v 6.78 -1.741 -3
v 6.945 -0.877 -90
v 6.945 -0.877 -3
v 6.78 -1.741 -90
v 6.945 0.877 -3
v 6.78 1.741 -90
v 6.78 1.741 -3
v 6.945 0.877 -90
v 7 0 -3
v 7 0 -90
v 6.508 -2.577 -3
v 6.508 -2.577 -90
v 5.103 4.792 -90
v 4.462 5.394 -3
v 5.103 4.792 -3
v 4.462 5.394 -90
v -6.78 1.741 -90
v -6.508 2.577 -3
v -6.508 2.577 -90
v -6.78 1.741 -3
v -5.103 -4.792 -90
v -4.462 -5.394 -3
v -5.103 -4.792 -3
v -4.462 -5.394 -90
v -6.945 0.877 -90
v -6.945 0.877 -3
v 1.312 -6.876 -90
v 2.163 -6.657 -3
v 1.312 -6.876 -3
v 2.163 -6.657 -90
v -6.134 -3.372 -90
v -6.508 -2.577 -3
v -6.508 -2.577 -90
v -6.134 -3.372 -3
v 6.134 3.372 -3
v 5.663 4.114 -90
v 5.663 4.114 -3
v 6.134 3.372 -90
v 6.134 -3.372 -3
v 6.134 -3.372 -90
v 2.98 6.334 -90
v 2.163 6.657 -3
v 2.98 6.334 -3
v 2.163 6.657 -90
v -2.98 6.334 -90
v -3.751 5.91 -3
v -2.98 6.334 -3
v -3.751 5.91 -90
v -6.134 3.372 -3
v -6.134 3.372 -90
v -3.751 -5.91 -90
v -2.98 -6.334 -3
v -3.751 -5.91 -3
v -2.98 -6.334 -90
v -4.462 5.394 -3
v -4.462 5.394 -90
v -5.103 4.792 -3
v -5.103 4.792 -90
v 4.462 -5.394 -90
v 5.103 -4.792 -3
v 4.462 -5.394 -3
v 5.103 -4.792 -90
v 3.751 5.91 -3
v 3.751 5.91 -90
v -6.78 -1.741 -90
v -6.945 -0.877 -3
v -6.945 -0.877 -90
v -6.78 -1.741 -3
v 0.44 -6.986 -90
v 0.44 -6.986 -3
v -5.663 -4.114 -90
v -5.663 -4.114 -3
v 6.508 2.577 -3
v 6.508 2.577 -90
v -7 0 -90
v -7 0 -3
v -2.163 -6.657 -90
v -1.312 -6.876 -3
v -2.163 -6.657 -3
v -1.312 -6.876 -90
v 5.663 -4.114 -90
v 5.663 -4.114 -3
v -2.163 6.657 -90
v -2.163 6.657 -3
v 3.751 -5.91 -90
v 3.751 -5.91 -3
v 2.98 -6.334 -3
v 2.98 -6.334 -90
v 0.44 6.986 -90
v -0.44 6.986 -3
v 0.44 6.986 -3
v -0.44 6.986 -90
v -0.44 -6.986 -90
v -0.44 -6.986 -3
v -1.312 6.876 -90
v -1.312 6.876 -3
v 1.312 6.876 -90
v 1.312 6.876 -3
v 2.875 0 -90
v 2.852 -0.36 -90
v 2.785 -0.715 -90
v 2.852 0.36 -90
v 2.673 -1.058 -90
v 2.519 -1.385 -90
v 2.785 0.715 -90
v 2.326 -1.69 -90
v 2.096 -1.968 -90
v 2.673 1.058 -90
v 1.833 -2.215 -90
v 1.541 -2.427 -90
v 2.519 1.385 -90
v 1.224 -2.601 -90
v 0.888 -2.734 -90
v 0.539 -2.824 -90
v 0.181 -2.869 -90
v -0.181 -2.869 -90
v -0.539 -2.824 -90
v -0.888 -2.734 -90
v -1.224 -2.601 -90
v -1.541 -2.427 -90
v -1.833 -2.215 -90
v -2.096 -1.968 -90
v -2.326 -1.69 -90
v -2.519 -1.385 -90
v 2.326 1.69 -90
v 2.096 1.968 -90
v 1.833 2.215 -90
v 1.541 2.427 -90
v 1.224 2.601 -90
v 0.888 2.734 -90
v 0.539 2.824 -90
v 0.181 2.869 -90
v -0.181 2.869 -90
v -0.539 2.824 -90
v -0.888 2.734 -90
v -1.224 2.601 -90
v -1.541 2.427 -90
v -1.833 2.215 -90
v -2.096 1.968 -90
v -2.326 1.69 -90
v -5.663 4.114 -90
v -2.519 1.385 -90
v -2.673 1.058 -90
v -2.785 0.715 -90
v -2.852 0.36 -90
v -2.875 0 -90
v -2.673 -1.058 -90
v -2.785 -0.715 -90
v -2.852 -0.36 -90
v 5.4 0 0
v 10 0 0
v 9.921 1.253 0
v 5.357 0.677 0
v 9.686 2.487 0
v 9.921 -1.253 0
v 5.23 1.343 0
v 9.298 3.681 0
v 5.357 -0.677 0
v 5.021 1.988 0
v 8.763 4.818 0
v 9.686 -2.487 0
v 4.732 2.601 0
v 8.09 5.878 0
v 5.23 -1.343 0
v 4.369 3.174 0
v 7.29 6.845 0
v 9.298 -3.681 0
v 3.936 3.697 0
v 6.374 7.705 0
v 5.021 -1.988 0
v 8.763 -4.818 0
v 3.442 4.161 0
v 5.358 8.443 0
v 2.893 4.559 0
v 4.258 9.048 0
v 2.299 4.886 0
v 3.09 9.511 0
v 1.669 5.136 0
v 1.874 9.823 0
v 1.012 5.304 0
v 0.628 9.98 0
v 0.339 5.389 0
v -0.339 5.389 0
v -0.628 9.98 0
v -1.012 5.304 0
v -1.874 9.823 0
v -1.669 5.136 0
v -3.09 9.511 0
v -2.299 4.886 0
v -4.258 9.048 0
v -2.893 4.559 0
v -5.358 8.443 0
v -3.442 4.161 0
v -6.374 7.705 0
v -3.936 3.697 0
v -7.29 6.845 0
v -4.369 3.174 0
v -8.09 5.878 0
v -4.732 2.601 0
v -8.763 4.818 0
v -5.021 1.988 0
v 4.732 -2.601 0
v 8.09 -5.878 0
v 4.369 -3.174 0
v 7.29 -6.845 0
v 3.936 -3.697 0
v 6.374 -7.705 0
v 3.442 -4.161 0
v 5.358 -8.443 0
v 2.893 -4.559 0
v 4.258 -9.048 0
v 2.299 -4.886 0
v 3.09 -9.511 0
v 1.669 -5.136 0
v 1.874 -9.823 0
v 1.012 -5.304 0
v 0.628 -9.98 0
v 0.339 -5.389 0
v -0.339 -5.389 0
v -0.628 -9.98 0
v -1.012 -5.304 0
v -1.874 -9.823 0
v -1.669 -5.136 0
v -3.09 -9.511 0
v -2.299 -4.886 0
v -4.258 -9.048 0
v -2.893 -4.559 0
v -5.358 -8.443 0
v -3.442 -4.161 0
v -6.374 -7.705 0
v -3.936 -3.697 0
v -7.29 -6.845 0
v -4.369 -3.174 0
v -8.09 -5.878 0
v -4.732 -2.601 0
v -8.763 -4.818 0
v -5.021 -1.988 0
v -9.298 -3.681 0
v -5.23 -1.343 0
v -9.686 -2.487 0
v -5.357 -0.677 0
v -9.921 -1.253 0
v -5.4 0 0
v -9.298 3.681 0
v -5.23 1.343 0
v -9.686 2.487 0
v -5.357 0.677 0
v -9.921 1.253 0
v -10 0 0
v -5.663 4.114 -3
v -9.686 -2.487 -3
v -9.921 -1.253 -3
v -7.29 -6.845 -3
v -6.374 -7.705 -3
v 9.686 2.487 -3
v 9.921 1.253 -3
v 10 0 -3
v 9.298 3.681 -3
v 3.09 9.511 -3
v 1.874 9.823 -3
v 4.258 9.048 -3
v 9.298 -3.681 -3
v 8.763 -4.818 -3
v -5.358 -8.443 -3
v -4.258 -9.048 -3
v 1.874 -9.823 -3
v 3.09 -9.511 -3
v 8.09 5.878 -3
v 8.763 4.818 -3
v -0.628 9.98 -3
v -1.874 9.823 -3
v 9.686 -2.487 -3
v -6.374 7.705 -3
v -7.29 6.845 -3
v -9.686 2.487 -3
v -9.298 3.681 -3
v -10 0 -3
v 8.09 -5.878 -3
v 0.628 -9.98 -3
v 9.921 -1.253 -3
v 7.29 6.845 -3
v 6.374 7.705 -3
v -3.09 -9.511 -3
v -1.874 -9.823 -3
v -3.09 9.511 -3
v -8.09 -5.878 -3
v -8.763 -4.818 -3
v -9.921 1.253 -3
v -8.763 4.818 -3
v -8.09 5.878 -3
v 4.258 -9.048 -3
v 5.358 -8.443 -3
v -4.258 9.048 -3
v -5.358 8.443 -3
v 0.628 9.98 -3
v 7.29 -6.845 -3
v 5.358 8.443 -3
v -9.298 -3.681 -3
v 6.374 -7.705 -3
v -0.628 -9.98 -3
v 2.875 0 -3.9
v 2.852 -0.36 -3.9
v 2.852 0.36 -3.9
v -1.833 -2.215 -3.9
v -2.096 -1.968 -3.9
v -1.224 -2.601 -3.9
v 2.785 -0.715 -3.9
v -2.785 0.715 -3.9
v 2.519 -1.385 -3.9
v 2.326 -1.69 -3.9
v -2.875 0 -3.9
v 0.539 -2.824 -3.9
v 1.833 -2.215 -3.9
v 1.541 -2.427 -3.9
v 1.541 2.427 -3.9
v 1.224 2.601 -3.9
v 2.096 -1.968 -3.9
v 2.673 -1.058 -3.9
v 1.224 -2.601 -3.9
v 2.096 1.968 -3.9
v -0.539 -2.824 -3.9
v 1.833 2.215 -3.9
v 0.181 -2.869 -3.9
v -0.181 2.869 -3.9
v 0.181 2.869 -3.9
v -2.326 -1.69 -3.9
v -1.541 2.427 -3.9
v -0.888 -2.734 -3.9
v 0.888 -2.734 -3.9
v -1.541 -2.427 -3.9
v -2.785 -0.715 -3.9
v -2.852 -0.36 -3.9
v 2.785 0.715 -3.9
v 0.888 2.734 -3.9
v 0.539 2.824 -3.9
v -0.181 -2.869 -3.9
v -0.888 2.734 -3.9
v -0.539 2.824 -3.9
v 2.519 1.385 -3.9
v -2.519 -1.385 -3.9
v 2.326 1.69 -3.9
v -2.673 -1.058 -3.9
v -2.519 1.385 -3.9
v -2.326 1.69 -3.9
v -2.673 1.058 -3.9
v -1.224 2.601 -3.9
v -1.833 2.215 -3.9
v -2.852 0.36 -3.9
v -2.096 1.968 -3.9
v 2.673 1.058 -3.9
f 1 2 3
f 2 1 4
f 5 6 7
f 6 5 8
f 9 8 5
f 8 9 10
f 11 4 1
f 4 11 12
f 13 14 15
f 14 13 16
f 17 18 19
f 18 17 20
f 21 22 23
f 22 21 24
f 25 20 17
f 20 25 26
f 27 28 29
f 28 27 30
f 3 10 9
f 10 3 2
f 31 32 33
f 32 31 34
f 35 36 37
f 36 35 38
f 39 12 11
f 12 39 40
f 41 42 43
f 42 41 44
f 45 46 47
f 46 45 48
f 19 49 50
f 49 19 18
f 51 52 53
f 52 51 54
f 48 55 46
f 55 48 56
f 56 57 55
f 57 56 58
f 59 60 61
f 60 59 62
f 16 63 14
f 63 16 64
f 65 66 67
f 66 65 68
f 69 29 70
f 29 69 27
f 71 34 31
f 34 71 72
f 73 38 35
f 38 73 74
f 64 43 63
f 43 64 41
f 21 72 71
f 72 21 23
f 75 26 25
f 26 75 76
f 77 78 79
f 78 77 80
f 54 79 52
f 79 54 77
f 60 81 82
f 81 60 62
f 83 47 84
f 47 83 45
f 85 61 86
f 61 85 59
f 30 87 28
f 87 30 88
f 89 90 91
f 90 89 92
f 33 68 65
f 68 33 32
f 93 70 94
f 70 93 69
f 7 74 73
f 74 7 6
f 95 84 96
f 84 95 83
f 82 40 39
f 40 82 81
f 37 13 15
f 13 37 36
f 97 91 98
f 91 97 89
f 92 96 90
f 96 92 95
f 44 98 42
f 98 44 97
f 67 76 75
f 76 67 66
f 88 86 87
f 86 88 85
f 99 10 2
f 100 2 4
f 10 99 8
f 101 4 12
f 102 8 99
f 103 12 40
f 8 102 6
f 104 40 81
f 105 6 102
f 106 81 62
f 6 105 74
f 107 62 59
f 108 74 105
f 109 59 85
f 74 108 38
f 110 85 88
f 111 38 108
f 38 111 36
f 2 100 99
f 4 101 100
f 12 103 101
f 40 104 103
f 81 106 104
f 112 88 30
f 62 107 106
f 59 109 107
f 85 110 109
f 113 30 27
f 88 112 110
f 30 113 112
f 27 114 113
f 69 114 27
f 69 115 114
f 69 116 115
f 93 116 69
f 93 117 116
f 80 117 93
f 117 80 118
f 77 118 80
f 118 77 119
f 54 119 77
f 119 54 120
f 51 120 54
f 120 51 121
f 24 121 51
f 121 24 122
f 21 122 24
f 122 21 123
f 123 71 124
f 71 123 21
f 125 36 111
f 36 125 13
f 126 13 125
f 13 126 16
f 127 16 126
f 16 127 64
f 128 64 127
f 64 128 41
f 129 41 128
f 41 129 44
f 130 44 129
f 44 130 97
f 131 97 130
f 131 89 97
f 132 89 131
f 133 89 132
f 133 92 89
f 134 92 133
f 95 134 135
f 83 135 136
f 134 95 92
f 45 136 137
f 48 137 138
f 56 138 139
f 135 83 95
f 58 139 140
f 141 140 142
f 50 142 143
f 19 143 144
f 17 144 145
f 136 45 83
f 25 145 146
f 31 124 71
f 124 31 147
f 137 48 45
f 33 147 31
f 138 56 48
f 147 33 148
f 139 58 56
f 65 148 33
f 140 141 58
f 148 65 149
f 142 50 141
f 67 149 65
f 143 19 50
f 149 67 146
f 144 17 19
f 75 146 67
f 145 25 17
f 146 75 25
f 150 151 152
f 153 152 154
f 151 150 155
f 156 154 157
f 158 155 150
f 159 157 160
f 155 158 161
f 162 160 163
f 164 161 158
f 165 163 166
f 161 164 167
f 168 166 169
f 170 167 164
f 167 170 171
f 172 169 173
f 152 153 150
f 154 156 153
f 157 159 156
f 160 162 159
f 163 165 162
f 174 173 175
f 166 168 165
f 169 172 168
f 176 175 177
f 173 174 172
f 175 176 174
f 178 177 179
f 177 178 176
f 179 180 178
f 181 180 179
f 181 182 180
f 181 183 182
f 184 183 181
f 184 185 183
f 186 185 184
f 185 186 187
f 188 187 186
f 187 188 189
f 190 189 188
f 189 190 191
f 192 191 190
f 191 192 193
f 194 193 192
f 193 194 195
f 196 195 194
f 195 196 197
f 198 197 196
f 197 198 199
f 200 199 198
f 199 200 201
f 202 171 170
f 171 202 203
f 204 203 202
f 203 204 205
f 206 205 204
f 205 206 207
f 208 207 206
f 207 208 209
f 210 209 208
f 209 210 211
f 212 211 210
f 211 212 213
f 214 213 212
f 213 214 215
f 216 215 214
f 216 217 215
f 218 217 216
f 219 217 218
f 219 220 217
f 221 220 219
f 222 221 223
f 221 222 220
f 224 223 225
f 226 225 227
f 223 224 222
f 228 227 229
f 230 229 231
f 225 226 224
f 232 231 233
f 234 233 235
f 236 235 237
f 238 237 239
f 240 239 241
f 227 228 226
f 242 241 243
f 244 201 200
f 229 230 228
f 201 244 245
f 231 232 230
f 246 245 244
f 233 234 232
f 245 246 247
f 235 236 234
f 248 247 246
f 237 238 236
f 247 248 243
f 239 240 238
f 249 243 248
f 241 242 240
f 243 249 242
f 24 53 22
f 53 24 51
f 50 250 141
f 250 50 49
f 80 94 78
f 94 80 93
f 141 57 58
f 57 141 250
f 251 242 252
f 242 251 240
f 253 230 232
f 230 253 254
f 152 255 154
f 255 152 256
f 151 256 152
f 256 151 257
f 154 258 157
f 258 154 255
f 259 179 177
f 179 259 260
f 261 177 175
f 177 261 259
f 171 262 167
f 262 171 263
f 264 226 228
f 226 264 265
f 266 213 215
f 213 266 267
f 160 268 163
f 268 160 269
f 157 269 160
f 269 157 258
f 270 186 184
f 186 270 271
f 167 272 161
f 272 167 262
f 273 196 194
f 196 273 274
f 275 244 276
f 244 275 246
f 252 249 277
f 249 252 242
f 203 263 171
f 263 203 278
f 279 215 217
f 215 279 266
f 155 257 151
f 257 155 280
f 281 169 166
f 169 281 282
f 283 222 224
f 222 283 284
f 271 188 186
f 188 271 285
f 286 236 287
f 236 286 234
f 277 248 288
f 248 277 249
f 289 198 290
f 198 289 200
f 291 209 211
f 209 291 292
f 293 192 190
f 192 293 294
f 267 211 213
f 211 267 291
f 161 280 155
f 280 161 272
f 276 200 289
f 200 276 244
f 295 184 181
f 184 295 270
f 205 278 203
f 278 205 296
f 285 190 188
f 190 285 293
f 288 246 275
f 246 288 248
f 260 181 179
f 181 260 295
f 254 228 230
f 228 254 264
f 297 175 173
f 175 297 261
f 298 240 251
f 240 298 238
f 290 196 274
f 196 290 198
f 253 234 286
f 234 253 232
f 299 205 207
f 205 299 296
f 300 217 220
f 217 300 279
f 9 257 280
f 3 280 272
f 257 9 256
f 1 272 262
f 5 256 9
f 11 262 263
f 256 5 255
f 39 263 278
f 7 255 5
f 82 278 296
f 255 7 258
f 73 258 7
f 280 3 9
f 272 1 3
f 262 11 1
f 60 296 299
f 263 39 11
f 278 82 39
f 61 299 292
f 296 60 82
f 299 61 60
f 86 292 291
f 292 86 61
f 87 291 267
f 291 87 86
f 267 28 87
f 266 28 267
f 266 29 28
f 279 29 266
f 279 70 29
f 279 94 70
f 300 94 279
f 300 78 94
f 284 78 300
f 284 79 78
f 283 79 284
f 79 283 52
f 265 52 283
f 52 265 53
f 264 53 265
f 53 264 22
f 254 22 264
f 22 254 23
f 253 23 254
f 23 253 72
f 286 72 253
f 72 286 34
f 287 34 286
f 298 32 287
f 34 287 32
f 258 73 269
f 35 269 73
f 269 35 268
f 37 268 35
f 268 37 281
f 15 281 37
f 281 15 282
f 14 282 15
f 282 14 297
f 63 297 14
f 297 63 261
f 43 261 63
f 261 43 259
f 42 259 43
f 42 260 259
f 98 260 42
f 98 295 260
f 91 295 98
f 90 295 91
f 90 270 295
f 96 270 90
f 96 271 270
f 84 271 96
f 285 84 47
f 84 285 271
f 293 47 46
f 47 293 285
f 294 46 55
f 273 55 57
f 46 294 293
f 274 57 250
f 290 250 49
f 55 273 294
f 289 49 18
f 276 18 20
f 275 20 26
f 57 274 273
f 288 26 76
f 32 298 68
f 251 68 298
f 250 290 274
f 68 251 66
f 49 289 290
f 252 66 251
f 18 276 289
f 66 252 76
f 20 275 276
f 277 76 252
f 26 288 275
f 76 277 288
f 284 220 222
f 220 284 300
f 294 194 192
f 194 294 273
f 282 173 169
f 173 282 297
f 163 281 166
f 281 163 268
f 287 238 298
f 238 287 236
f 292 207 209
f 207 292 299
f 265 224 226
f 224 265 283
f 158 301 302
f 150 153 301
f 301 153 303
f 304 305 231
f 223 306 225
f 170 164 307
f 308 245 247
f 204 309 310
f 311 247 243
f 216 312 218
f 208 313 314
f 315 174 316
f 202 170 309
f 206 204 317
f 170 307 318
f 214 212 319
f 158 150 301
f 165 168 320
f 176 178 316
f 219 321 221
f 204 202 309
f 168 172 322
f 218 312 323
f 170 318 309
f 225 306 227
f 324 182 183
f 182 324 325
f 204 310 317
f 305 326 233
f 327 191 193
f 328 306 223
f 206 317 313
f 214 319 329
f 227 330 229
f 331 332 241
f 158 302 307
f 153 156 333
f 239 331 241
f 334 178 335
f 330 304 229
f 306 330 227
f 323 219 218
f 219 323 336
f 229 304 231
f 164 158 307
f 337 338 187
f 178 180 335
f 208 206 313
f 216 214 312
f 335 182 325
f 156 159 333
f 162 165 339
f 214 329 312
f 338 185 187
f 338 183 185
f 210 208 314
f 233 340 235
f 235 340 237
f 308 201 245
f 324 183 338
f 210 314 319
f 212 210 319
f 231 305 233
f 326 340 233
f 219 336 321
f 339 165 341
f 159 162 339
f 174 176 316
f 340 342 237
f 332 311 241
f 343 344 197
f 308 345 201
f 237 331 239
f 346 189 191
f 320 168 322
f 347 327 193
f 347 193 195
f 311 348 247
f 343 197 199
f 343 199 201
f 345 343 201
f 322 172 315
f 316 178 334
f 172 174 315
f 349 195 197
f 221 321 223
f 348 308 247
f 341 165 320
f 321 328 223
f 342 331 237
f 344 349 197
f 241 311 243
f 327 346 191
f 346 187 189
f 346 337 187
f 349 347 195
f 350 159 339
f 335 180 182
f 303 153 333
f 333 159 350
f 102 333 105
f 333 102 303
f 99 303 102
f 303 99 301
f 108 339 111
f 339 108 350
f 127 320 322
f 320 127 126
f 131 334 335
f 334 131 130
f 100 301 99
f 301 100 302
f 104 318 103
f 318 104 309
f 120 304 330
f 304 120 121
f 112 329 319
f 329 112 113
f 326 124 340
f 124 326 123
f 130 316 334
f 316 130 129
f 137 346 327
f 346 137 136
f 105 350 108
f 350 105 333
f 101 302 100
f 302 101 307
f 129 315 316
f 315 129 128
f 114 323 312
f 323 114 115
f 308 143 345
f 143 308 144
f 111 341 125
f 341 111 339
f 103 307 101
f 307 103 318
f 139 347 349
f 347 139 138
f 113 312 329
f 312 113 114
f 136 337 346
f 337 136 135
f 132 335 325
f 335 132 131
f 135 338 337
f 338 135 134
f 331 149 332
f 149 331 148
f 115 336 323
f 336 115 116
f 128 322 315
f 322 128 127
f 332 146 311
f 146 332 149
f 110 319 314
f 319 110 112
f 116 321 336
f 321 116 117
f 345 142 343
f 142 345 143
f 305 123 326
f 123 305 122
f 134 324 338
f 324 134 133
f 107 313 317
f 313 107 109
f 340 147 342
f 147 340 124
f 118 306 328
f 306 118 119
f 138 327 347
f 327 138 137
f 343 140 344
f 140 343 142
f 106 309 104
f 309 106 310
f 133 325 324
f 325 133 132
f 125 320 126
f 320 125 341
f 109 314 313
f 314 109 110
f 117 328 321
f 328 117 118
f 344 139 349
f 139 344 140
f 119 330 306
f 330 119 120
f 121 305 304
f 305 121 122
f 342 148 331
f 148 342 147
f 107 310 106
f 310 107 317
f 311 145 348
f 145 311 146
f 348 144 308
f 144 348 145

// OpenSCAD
$fn = 50;


difference() {
	union() {
		translate(v = [0, 0, -90.0000000000]) {
			cylinder(h = 90, r = 7.0000000000);
		}
		translate(v = [0, 0, -3.0000000000]) {
			cylinder(h = 3, r = 10.0000000000);
		}
	}
	union() {
		translate(v = [0, 0, 0]) {
			rotate(a = [0, 0, 0]) {
				difference() {
					union() {
						#translate(v = [0, 0, -90.0000000000]) {
							cylinder(h = 90, r = 2.6000000000);
						}
						#translate(v = [0, 0, -3.9000000000]) {
							cylinder(h = 3.9000000000, r = 7.0000000000, r1 = 2.8750000000, r2 = 5.4000000000);
						}
						#translate(v = [0, 0, -90.0000000000]) {
							cylinder(h = 90, r = 2.8750000000);
						}
						#translate(v = [0, 0, -90.0000000000]) {
							cylinder(h = 90, r = 2.6000000000);
						}
					}
					union();
				}
			}
		}
	}
}
